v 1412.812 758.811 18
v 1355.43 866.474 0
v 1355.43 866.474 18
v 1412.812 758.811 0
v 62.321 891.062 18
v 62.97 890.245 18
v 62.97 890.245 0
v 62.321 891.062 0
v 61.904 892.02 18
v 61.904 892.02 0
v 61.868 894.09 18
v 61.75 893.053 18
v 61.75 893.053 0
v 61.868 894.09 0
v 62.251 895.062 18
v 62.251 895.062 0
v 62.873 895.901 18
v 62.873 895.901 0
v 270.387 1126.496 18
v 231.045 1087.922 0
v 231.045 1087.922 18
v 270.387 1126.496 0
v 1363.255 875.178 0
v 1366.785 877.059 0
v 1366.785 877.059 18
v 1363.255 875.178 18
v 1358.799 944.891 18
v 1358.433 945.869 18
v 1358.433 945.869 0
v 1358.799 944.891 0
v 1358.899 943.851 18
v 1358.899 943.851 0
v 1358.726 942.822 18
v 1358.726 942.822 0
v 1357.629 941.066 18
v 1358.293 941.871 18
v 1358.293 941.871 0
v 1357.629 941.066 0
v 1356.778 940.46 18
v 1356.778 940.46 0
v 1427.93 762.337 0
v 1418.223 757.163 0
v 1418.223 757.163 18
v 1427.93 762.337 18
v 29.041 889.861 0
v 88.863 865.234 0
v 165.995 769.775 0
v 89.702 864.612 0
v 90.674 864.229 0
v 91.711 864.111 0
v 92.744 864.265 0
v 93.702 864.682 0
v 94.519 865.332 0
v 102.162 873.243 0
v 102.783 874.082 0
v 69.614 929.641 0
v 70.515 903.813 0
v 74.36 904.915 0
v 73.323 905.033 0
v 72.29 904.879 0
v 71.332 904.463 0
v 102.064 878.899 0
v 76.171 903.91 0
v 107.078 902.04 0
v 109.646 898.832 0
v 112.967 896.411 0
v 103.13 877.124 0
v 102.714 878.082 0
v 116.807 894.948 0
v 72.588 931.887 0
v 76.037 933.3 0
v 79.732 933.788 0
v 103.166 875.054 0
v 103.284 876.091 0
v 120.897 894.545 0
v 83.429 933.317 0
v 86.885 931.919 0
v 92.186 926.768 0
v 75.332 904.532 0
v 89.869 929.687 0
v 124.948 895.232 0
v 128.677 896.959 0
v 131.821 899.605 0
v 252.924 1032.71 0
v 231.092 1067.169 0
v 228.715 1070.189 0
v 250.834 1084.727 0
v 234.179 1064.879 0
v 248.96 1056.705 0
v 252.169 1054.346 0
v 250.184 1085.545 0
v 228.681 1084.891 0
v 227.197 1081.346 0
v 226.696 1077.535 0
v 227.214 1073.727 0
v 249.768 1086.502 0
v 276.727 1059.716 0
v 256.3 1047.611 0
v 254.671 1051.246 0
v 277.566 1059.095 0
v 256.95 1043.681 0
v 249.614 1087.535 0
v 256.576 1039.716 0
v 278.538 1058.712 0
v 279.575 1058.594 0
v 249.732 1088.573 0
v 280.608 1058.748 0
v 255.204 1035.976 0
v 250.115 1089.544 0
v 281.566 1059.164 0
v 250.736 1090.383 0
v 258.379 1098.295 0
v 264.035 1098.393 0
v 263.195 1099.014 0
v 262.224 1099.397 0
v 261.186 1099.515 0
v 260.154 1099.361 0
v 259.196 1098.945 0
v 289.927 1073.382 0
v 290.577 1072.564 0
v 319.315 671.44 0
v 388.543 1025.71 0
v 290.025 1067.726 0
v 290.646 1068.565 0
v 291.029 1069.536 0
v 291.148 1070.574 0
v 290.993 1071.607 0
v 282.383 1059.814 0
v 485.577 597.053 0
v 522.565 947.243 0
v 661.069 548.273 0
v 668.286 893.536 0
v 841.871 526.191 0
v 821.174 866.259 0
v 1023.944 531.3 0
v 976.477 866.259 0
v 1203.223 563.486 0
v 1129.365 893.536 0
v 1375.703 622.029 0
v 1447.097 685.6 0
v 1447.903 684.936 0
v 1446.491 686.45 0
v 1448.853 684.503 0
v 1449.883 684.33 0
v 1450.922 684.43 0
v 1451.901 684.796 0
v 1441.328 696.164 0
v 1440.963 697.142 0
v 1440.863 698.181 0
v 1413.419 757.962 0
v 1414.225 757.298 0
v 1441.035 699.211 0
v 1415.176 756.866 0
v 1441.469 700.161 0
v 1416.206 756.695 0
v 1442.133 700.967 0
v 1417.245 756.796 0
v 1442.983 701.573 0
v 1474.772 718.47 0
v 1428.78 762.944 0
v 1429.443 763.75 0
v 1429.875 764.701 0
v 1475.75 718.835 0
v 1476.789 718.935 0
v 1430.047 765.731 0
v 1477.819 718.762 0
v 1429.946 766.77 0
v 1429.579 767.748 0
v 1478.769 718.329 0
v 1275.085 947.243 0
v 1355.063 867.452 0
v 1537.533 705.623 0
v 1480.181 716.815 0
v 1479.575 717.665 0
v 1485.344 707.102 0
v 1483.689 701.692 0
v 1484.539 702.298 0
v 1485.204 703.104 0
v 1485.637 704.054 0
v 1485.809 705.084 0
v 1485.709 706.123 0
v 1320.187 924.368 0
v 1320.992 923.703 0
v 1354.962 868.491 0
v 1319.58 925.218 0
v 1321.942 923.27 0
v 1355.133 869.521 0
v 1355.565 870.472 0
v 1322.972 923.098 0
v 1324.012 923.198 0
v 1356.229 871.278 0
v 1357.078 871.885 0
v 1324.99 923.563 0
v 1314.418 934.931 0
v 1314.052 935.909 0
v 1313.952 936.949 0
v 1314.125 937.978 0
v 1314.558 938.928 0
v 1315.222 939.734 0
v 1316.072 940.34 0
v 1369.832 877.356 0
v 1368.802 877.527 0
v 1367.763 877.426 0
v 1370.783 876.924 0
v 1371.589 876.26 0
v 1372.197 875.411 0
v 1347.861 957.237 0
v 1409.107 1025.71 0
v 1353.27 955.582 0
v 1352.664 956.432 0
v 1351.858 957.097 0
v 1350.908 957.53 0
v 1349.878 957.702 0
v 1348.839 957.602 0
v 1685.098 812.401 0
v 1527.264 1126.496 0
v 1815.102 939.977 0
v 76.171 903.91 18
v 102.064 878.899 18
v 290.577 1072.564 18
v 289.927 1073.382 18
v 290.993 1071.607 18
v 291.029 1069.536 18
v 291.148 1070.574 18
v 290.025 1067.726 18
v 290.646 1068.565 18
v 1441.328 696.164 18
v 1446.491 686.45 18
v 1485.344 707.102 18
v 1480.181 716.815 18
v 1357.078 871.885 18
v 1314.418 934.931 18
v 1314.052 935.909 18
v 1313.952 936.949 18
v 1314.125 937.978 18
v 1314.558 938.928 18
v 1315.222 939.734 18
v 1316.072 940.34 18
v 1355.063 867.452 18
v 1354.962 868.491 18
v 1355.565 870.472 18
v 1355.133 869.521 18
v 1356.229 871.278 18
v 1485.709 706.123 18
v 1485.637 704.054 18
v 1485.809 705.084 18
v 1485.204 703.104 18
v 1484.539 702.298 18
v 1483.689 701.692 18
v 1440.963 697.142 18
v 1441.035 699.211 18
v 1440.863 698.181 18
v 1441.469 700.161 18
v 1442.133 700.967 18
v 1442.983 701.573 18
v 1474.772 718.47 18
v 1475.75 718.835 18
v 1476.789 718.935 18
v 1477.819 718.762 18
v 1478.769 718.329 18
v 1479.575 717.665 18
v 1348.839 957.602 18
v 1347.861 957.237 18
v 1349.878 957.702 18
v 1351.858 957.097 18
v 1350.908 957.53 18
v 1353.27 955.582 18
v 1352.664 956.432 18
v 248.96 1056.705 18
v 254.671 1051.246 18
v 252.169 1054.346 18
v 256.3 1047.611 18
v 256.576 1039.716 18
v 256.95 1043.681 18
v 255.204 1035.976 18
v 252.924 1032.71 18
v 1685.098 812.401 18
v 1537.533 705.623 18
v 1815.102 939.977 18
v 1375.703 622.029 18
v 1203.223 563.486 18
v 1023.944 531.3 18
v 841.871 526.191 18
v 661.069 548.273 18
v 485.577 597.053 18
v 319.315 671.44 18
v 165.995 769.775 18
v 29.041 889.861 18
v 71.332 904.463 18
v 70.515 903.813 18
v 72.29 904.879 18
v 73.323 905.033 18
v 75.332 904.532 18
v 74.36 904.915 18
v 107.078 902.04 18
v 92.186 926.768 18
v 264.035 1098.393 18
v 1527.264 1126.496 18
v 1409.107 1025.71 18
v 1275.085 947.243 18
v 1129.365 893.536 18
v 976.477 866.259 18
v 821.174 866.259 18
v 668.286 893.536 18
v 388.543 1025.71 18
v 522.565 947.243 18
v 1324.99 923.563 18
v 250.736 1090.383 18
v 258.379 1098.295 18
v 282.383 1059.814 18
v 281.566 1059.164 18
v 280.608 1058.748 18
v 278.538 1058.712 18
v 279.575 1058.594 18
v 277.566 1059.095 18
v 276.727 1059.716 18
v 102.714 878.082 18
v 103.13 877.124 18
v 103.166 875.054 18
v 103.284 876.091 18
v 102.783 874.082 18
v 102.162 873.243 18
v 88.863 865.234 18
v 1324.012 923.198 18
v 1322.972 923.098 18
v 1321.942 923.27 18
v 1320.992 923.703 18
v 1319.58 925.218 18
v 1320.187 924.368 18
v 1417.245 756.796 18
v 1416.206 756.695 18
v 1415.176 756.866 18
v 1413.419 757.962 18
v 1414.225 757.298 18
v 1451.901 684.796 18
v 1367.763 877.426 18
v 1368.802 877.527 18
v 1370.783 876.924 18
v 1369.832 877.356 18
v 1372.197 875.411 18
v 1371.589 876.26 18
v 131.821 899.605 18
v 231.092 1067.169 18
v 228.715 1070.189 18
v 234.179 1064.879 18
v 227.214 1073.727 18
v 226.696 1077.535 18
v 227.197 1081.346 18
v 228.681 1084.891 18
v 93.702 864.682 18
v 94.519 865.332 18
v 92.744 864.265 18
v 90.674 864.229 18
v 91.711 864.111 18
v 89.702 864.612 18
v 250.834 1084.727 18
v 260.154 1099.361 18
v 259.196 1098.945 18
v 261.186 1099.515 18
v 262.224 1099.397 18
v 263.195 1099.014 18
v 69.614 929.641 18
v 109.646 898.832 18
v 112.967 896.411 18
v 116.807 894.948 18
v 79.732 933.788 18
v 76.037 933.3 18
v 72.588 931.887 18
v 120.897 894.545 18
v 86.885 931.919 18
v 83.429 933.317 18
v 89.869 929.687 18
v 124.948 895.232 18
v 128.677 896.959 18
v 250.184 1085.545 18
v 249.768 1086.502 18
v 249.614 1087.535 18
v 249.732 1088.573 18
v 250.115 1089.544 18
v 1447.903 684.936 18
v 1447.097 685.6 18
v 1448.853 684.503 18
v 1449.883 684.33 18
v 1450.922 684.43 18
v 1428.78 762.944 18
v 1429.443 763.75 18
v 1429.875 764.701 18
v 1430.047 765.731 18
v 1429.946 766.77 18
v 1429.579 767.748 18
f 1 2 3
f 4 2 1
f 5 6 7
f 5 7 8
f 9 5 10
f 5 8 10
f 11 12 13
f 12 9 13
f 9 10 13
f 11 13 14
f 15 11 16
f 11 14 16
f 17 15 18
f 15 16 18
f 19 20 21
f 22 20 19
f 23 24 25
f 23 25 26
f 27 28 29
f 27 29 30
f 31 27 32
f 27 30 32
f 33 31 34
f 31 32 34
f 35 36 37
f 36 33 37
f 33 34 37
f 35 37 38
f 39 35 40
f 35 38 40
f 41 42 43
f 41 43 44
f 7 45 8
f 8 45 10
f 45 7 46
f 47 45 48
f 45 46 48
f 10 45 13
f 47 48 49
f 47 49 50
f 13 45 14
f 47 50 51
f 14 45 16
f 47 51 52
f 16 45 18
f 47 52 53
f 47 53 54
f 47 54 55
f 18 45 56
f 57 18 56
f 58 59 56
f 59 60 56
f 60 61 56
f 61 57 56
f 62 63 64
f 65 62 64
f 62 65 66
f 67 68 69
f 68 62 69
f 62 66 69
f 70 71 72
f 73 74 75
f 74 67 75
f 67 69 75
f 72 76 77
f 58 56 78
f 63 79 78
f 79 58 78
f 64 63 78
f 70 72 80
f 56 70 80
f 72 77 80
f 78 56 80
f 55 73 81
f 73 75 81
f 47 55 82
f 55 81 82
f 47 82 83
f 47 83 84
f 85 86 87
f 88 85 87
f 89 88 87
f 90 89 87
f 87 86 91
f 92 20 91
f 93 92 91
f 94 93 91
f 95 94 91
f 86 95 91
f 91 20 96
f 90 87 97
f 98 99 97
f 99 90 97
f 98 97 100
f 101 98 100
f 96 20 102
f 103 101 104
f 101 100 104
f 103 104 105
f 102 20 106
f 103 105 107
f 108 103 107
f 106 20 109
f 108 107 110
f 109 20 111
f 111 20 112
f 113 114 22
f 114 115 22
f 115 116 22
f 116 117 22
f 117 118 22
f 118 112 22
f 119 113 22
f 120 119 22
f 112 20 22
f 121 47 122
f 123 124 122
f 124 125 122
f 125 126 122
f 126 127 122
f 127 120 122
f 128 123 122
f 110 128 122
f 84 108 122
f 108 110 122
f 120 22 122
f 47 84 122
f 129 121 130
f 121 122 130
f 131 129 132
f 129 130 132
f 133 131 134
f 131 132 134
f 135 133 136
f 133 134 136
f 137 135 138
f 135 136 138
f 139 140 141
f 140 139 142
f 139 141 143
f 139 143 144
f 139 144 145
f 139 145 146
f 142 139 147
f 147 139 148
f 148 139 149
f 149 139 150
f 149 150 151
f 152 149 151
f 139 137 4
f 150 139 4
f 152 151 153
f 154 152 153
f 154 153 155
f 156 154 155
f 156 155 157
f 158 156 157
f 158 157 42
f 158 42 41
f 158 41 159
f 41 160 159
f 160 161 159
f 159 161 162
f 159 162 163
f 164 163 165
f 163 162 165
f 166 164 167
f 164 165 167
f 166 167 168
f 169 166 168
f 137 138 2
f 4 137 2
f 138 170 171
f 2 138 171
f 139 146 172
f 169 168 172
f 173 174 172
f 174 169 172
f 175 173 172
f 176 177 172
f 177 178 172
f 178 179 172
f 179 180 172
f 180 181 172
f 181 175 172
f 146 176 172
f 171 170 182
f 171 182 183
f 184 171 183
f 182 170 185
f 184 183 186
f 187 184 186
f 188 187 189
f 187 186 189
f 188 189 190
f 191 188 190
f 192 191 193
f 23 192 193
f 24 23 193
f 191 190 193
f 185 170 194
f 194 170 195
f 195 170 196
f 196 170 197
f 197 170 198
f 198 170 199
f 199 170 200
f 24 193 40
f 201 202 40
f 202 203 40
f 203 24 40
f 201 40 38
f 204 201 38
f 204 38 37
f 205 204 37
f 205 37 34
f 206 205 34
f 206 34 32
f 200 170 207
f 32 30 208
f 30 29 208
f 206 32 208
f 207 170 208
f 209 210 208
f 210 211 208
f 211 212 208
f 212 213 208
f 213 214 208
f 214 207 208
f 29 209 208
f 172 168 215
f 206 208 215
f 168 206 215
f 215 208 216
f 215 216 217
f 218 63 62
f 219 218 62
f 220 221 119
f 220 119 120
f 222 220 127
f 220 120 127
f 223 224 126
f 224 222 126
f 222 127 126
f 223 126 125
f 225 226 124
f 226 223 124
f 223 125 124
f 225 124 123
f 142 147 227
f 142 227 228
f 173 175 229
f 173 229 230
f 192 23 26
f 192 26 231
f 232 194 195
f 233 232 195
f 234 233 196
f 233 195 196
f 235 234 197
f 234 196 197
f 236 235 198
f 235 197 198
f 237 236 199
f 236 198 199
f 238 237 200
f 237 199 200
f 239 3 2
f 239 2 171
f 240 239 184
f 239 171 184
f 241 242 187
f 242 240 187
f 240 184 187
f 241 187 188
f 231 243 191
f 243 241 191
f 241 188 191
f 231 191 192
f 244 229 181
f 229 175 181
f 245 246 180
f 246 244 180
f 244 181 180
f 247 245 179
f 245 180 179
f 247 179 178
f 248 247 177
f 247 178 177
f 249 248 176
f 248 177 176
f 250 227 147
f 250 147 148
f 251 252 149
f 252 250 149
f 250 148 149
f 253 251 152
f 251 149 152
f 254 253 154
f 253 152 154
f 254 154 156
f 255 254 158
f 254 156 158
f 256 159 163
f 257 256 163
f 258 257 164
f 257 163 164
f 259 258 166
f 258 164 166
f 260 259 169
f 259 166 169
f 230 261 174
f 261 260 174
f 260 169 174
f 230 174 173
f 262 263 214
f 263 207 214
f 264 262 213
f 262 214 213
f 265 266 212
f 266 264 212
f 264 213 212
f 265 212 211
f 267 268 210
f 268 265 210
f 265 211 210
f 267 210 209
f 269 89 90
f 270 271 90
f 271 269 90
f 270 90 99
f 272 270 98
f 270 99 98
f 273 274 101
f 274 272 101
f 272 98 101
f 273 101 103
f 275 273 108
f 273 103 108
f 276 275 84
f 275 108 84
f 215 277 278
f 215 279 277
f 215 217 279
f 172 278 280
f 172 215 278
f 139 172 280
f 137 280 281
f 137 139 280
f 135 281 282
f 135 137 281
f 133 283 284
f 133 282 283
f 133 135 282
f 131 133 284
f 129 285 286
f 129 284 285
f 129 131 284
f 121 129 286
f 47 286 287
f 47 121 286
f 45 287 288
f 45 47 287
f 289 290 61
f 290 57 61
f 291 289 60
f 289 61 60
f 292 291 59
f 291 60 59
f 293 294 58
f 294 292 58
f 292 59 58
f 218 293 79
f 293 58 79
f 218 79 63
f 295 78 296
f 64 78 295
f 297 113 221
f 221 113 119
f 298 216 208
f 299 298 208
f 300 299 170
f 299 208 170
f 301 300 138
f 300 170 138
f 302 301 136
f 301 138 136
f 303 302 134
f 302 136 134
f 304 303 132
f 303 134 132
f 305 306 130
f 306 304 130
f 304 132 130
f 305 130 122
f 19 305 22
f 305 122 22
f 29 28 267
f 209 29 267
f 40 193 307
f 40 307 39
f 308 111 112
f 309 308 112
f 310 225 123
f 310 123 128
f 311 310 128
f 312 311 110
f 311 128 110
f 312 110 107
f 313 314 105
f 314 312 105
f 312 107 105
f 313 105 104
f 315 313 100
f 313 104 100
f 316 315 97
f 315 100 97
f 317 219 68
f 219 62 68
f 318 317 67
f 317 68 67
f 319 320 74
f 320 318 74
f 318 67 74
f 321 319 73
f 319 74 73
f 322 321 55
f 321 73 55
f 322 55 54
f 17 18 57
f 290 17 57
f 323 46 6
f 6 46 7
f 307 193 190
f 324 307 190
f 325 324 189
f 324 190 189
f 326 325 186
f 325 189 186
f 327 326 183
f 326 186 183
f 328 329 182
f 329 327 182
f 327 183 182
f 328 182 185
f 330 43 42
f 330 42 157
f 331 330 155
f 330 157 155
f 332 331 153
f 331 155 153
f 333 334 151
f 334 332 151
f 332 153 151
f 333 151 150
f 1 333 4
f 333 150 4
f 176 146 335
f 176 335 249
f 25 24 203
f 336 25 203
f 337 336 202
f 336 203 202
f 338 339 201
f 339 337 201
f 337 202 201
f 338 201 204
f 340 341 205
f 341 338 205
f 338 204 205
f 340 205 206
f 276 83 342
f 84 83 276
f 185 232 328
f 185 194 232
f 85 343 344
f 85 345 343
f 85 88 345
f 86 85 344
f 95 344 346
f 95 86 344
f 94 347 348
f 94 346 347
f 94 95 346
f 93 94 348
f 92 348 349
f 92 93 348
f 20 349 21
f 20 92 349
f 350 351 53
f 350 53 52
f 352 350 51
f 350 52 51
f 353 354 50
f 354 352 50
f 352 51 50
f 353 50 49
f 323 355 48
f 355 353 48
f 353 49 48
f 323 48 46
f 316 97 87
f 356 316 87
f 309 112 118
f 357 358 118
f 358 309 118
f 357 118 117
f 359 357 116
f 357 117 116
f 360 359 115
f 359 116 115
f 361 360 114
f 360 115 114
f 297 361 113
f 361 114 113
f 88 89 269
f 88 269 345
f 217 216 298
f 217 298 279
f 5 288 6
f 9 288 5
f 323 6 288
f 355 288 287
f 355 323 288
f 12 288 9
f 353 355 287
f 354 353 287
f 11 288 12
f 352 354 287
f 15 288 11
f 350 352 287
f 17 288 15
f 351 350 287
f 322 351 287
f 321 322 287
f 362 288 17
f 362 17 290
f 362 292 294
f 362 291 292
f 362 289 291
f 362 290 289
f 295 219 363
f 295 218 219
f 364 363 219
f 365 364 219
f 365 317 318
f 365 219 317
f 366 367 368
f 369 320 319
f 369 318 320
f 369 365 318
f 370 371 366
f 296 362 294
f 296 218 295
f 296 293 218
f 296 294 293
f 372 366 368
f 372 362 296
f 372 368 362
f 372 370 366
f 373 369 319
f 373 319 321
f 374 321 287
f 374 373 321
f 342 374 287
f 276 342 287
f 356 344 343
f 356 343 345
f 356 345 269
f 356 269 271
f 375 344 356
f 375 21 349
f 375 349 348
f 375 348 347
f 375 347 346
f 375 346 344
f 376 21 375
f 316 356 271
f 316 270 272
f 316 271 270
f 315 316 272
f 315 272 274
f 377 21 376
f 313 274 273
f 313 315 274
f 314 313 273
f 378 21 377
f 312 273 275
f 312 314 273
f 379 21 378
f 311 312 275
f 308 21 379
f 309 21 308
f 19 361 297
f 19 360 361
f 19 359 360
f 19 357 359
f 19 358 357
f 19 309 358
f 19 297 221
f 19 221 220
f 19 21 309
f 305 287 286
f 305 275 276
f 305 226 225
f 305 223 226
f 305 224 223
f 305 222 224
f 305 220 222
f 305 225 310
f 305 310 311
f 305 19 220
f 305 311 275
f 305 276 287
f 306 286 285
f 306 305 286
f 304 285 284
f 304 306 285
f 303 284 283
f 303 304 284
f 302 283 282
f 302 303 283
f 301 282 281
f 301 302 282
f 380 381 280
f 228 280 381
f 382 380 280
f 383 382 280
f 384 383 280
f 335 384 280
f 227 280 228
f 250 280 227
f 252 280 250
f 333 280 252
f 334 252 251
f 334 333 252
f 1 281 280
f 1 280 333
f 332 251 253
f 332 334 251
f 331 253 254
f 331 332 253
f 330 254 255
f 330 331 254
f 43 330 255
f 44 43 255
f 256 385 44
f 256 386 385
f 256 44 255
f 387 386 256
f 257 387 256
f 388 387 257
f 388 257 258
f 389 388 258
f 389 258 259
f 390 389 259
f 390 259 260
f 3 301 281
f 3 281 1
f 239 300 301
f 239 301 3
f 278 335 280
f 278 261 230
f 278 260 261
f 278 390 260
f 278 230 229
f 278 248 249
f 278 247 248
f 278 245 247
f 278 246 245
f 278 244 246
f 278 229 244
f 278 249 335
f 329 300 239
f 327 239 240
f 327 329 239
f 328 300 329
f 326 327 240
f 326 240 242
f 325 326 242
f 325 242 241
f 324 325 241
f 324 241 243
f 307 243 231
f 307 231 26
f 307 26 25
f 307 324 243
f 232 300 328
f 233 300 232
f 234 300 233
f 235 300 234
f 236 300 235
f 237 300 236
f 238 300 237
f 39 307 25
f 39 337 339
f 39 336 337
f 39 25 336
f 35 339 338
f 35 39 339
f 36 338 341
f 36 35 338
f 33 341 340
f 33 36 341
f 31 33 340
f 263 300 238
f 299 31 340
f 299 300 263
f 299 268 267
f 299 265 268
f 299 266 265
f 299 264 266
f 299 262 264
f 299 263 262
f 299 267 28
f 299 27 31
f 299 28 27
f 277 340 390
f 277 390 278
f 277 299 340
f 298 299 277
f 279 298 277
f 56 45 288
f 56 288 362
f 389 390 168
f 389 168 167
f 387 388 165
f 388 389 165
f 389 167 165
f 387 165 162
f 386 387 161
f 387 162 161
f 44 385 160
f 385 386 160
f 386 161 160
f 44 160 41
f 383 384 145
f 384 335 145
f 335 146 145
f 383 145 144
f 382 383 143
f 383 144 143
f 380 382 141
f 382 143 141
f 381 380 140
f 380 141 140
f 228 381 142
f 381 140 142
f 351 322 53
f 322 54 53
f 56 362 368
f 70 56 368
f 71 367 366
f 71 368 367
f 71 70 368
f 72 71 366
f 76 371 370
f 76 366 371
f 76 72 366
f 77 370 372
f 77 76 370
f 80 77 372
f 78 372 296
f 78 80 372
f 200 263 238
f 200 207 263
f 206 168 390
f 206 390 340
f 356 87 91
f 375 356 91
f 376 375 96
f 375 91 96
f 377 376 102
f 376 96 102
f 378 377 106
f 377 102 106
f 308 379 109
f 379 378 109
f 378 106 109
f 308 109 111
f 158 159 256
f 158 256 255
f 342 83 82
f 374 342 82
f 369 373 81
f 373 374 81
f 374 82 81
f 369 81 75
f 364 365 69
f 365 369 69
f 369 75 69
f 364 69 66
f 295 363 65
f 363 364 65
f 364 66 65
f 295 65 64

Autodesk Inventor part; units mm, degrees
ref_plane "YZ Plane" through (0, 0, 0) normal (1, 0, 0) x (0, 1, 0)
ref_plane "XZ Plane" through (0, 0, 0) normal (0, 1, 0) x (-1, 0, 0)
ref_plane "XY Plane" through (0, 0, 0) normal (0, 0, 1) x (1, 0, 0)
sketch "CONTOURS" plane through (0, 0, 0) normal (0, 0, 1) x (1, 0, 0)
  line L0 (29.0412, 889.8609) -> (69.6135, 929.6413)
  arc A0 (92.1865, 926.768) -> (69.6135, 929.6413) centre (79.765, 919.2877) ccw
  line L1 (92.1865, 926.768) -> (107.0781, 902.0398)
  arc A1 (107.0781, 902.0398) -> (131.8211, 899.605) centre (120.3563, 910.0361) ccw
  line L2 (131.8211, 899.605) -> (252.9238, 1032.7101)
  arc A2 (252.9238, 1032.7101) -> (248.9601, 1056.7052) centre (241.459, 1043.1412) ccw
  line L3 (248.9601, 1056.7052) -> (234.1791, 1064.8793)
  arc A3 (231.0447, 1087.9218) -> (234.1791, 1064.8793) centre (241.1963, 1077.5683) ccw
  line L4 (231.0447, 1087.9218) -> (270.3869, 1126.4961)
  arc A4 (270.3869, 1126.4961) -> (1527.2637, 1126.4961) centre (898.8253, 1743.5906) ccw
  line L5 (1527.2637, 1126.4961) -> (1815.1018, 939.9773)
  arc A5 (29.0412, 889.8609) -> (1815.1018, 939.9773) centre (898.8169, 1743.6721) ccw
sketch "HOLES" plane through (0, 0, 0) normal (0, 0, 1) x (1, 0, 0)
  line L0 (290.0252, 1067.7256) -> (282.3828, 1059.8139)
  arc A0 (276.7268, 1059.716) -> (282.3828, 1059.8139) centre (279.5059, 1062.593) ccw
  line L1 (276.7268, 1059.716) -> (250.8342, 1084.7274)
  arc A1 (250.7363, 1090.3834) -> (250.8342, 1084.7274) centre (253.6132, 1087.6044) ccw
  line L2 (250.7363, 1090.3834) -> (258.3786, 1098.2951)
  arc A2 (264.0347, 1098.393) -> (258.3786, 1098.2951) centre (261.2556, 1095.516) ccw
  line L3 (264.0347, 1098.393) -> (289.9273, 1073.3816)
  arc A3 (290.0252, 1067.7256) -> (289.9273, 1073.3816) centre (287.1482, 1070.5046) ccw
  line L4 (102.1615, 873.2431) -> (94.5191, 865.3315)
  arc A4 (88.8631, 865.2335) -> (94.5191, 865.3315) centre (91.6422, 868.1105) ccw
  line L5 (88.8631, 865.2335) -> (62.9705, 890.245)
  arc A5 (62.8726, 895.901) -> (62.9705, 890.245) centre (65.7496, 893.1219) ccw
  line L6 (62.8726, 895.901) -> (70.515, 903.8126)
  arc A6 (76.171, 903.9105) -> (70.515, 903.8126) centre (73.3919, 901.0336) ccw
  arc A7 (102.1615, 873.2431) -> (102.0636, 878.8991) centre (99.2846, 876.0221) ccw
  line L7 (1358.4331, 945.869) -> (1353.2703, 955.5821)
  arc A8 (1353.2703, 955.5821) -> (1347.8609, 957.2368) centre (1349.7382, 953.7047) ccw
  line L8 (1347.8609, 957.2368) -> (1316.0723, 940.3404)
  arc A9 (1316.0723, 940.3404) -> (1314.4176, 934.931) centre (1317.9497, 936.8084) ccw
  line L9 (1314.4176, 934.931) -> (1319.5804, 925.2178)
  arc A10 (1319.5804, 925.2178) -> (1324.9899, 923.5631) centre (1323.1125, 927.0952) ccw
  line L10 (1324.9899, 923.5631) -> (1356.7784, 940.4595)
  arc A11 (1356.7784, 940.4595) -> (1358.4331, 945.869) centre (1354.901, 943.9916) ccw
  line L11 (1441.3284, 696.1636) -> (1446.4912, 686.4505)
  arc A12 (1446.4912, 686.4505) -> (1451.9006, 684.7958) centre (1450.0232, 688.3278) ccw
  line L12 (1451.9006, 684.7958) -> (1483.6892, 701.6922)
  arc A13 (1483.6892, 701.6922) -> (1485.3438, 707.1016) centre (1481.8118, 705.2242) ccw
  line L13 (1485.3438, 707.1016) -> (1480.181, 716.8148)
  arc A14 (1480.181, 716.8148) -> (1474.7716, 718.4695) centre (1476.649, 714.9374) ccw
  line L14 (1474.7716, 718.4695) -> (1442.9831, 701.5731)
  arc A15 (1442.9831, 701.5731) -> (1441.3284, 696.1636) centre (1444.8604, 698.041) ccw
  line L15 (1363.2554, 875.1779) -> (1357.078, 871.8854)
  arc A16 (1357.078, 871.8854) -> (1355.4295, 866.4741) centre (1358.9594, 868.3555) ccw
  line L16 (1355.4295, 866.4741) -> (1412.8118, 758.8114)
  arc A17 (1412.8118, 758.8114) -> (1418.2231, 757.1628) centre (1416.3417, 760.6927) ccw
  line L17 (1418.2231, 757.1628) -> (1427.9304, 762.3366)
  arc A18 (1427.9304, 762.3366) -> (1429.579, 767.7479) centre (1426.049, 765.8666) ccw
  line L18 (1429.579, 767.7479) -> (1372.1967, 875.4107)
  arc A19 (1372.1967, 875.4107) -> (1366.7853, 877.0592) centre (1368.6667, 873.5293) ccw
  line L19 (1366.7853, 877.0592) -> (1363.2554, 875.1779)
  line L20 (76.171, 903.9105) -> (102.0636, 878.8991)
sketch "LETTERS" plane through (0, 0, 0) normal (0, 0, 1) x (1, 0, 0)
  line L0 (246.1168, 901.1678) -> (246.0351, 901.3924)
  line L1 (246.0351, 901.3924) -> (245.9598, 901.6191)
  line L2 (245.9598, 901.6191) -> (245.8908, 901.8478)
  line L3 (245.8908, 901.8478) -> (245.8282, 902.0782)
  line L4 (245.8282, 902.0782) -> (245.7719, 902.3102)
  line L5 (245.7719, 902.3102) -> (245.722, 902.5436)
  line L6 (245.722, 902.5436) -> (245.6784, 902.7782)
  line L7 (245.6784, 902.7782) -> (245.6412, 903.0139)
  line L8 (245.6412, 903.0139) -> (245.6104, 903.2504)
  line L9 (245.6104, 903.2504) -> (245.586, 903.4876)
  line L10 (245.586, 903.4876) -> (245.5679, 903.7253)
  line L11 (245.5679, 903.7253) -> (245.5562, 903.9634)
  line L12 (245.5562, 903.9634) -> (245.551, 904.2015)
  line L13 (245.551, 904.2015) -> (245.5521, 904.4397)
  line L14 (245.5521, 904.4397) -> (245.5596, 904.6777)
  line L15 (245.5596, 904.6777) -> (245.5736, 904.9152)
  line L16 (245.5736, 904.9152) -> (245.594, 905.1522)
  line L17 (245.594, 905.1522) -> (245.6208, 905.3885)
  line L18 (245.6208, 905.3885) -> (245.654, 905.6238)
  line L19 (245.654, 905.6238) -> (245.6937, 905.8581)
  line L20 (245.6937, 905.8581) -> (245.7398, 906.0911)
  line L21 (245.7398, 906.0911) -> (245.7923, 906.3226)
  line L22 (245.7923, 906.3226) -> (245.8513, 906.5525)
  line L23 (245.8513, 906.5525) -> (245.9168, 906.7806)
  line L24 (245.9168, 906.7806) -> (245.9887, 907.0067)
  line L25 (245.9887, 907.0067) -> (246.0671, 907.2306)
  line L26 (246.0671, 907.2306) -> (246.1519, 907.4522)
  line L27 (246.1519, 907.4522) -> (246.2433, 907.6712)
  line L28 (246.2433, 907.6712) -> (246.3411, 907.8876)
  line L29 (246.3411, 907.8876) -> (246.4454, 908.1011)
  line L30 (246.4454, 908.1011) -> (246.5562, 908.3115)
  line L31 (246.5562, 908.3115) -> (246.6735, 908.5187)
  line L32 (246.6735, 908.5187) -> (246.7973, 908.7225)
  line L33 (246.7973, 908.7225) -> (246.9274, 908.9228)
  line L34 (246.9274, 908.9228) -> (247.0637, 909.1194)
  line L35 (247.0637, 909.1194) -> (247.2058, 909.3123)
  line L36 (247.2058, 909.3123) -> (247.3538, 909.5013)
  line L37 (247.3538, 909.5013) -> (247.5073, 909.6863)
  line L38 (247.5073, 909.6863) -> (247.6661, 909.8672)
  line L39 (247.6661, 909.8672) -> (247.8302, 910.0439)
  line L40 (247.8302, 910.0439) -> (247.9992, 910.2163)
  line L41 (247.9992, 910.2163) -> (248.1731, 910.3842)
  line L42 (248.1731, 910.3842) -> (248.3515, 910.5476)
  line L43 (248.3515, 910.5476) -> (248.5344, 910.7063)
  line L44 (248.5344, 910.7063) -> (248.7216, 910.8603)
  line L45 (248.7216, 910.8603) -> (248.9128, 911.0093)
  line L46 (248.9128, 911.0093) -> (249.1078, 911.1534)
  line L47 (249.1078, 911.1534) -> (249.3066, 911.2923)
  line L48 (249.3066, 911.2923) -> (249.5088, 911.426)
  line L49 (249.5088, 911.426) -> (249.7143, 911.5543)
  line L50 (249.7143, 911.5543) -> (249.9229, 911.6772)
  line L51 (249.9229, 911.6772) -> (250.1344, 911.7944)
  line L52 (250.1344, 911.7944) -> (250.3487, 911.906)
  line L53 (250.3487, 911.906) -> (250.5655, 912.0118)
  line L54 (250.5655, 912.0118) -> (250.7846, 912.1117)
  line L55 (250.7846, 912.1117) -> (251.0059, 912.2055)
  line L56 (251.0059, 912.2055) -> (251.2292, 912.2932)
  line L57 (251.2292, 912.2932) -> (251.4543, 912.3746)
  line L58 (251.4543, 912.3746) -> (251.6809, 912.4497)
  line L59 (251.6809, 912.4497) -> (251.909, 912.5182)
  line L60 (251.909, 912.5182) -> (252.1383, 912.5802)
  line L61 (252.1383, 912.5802) -> (252.3686, 912.6354)
  line L62 (252.3686, 912.6354) -> (252.5997, 912.6838)
  line L63 (252.5997, 912.6838) -> (252.8315, 912.7253)
  line L64 (252.8315, 912.7253) -> (253.0638, 912.7597)
  line L65 (253.0638, 912.7597) -> (253.2964, 912.7872)
  line L66 (253.2964, 912.7872) -> (253.5293, 912.8077)
  line L67 (253.5293, 912.8077) -> (253.7624, 912.8215)
  line L68 (253.7624, 912.8215) -> (253.9954, 912.8287)
  line L69 (253.9954, 912.8287) -> (254.2285, 912.8292)
  line L70 (254.2285, 912.8292) -> (254.4614, 912.8232)
  line L71 (254.4614, 912.8232) -> (254.694, 912.8108)
  line L72 (254.694, 912.8108) -> (254.9262, 912.7921)
  line L73 (254.9262, 912.7921) -> (255.158, 912.7672)
  line L74 (255.158, 912.7672) -> (255.3893, 912.7361)
  line L75 (255.3893, 912.7361) -> (255.6198, 912.699)
  line L76 (255.6198, 912.699) -> (255.8496, 912.656)
  line L77 (255.8496, 912.656) -> (256.0785, 912.6071)
  line L78 (256.0785, 912.6071) -> (256.3065, 912.5524)
  line L79 (256.3065, 912.5524) -> (256.5333, 912.4921)
  line L80 (256.5333, 912.4921) -> (256.759, 912.4263)
  line L81 (256.759, 912.4263) -> (256.9834, 912.3549)
  line L82 (256.9834, 912.3549) -> (257.2064, 912.2781)
  line L83 (257.2064, 912.2781) -> (257.4279, 912.1961)
  line L84 (257.4279, 912.1961) -> (257.6478, 912.1088)
  line L85 (257.6478, 912.1088) -> (257.8661, 912.0165)
  line L86 (257.8661, 912.0165) -> (258.0825, 911.9191)
  line L87 (258.0825, 911.9191) -> (258.297, 911.8168)
  line L88 (258.297, 911.8168) -> (258.5095, 911.7097)
  line L89 (258.5095, 911.7097) -> (258.7199, 911.5978)
  line L90 (258.7199, 911.5978) -> (258.9281, 911.4814)
  line L91 (258.9281, 911.4814) -> (259.134, 911.3603)
  line L92 (259.134, 911.3603) -> (259.3375, 911.2348)
  line L93 (259.3375, 911.2348) -> (259.5384, 911.105)
  line L94 (259.5384, 911.105) -> (259.7367, 910.9709)
  line L95 (259.7367, 910.9709) -> (259.9323, 910.8326)
  line L96 (259.9323, 910.8326) -> (260.1251, 910.6902)
  line L97 (260.1251, 910.6902) -> (260.315, 910.5438)
  line L98 (260.315, 910.5438) -> (260.5019, 910.3936)
  line L99 (260.5019, 910.3936) -> (260.6858, 910.2394)
  line L100 (260.6858, 910.2394) -> (260.8666, 910.0816)
  line L101 (260.8666, 910.0816) -> (261.0443, 909.92)
  line L102 (261.0443, 909.92) -> (261.2187, 909.7549)
  line L103 (261.2187, 909.7549) -> (261.3897, 909.5863)
  line L104 (261.3897, 909.5863) -> (261.5574, 909.4142)
  line L105 (261.5574, 909.4142) -> (261.7217, 909.2389)
  line L106 (261.7217, 909.2389) -> (261.8825, 909.0602)
  line L107 (261.8825, 909.0602) -> (262.0396, 908.8784)
  line L108 (262.0396, 908.8784) -> (262.1932, 908.6935)
  line L109 (262.1932, 908.6935) -> (262.343, 908.5056)
  line L110 (262.343, 908.5056) -> (262.489, 908.3148)
  line L111 (262.489, 908.3148) -> (262.6311, 908.1211)
  line L112 (262.6311, 908.1211) -> (262.7694, 907.9247)
  line L113 (262.7694, 907.9247) -> (262.9036, 907.7256)
  line L114 (262.9036, 907.7256) -> (263.0338, 907.5239)
  line L115 (263.0338, 907.5239) -> (263.1599, 907.3197)
  line L116 (263.1599, 907.3197) -> (263.2817, 907.1131)
  line L117 (263.2817, 907.1131) -> (263.3993, 906.9041)
  line L118 (263.3993, 906.9041) -> (263.5126, 906.6929)
  line L119 (263.5126, 906.6929) -> (263.6214, 906.4795)
  line L120 (263.6214, 906.4795) -> (263.7258, 906.264)
  line L121 (263.7258, 906.264) -> (263.8257, 906.0465)
  line L122 (263.8257, 906.0465) -> (263.9209, 905.827)
  line L123 (263.9209, 905.827) -> (264.0114, 905.6057)
  line L124 (264.0114, 905.6057) -> (264.0973, 905.3826)
  line L125 (264.0973, 905.3826) -> (264.1782, 905.1579)
  line L126 (264.1782, 905.1579) -> (264.2544, 904.9316)
  line L127 (264.2544, 904.9316) -> (264.3255, 904.7037)
  line L128 (264.3255, 904.7037) -> (264.3917, 904.4744)
  line L129 (264.3917, 904.4744) -> (264.4527, 904.2438)
  line L130 (264.4527, 904.2438) -> (264.5087, 904.012)
  line L131 (264.5087, 904.012) -> (264.5596, 903.7792)
  line L132 (264.5596, 903.7792) -> (264.6053, 903.5455)
  line L133 (264.6053, 903.5455) -> (264.6458, 903.3109)
  line L134 (264.6458, 903.3109) -> (264.6811, 903.0757)
  line L135 (264.6811, 903.0757) -> (264.7111, 902.84)
  line L136 (264.7111, 902.84) -> (264.7358, 902.6039)
  line L137 (264.7358, 902.6039) -> (264.7552, 902.3675)
  line L138 (264.7552, 902.3675) -> (264.7692, 902.1309)
  line L139 (264.7692, 902.1309) -> (264.7779, 901.8943)
  line L140 (264.7779, 901.8943) -> (264.781, 901.6578)
  line L141 (264.781, 901.6578) -> (264.7787, 901.4216)
  line L142 (264.7787, 901.4216) -> (264.7709, 901.1857)
  line L143 (264.7709, 901.1857) -> (264.7576, 900.9503)
  line L144 (264.7576, 900.9503) -> (264.7387, 900.7155)
  line L145 (264.7387, 900.7155) -> (264.7141, 900.4815)
  line L146 (264.7141, 900.4815) -> (264.684, 900.2483)
  line L147 (264.684, 900.2483) -> (264.6481, 900.0162)
  line L148 (264.6481, 900.0162) -> (264.6065, 899.7851)
  line L149 (264.6065, 899.7851) -> (264.5592, 899.5554)
  line L150 (264.5592, 899.5554) -> (264.5061, 899.327)
  line L151 (264.5061, 899.327) -> (264.4472, 899.1002)
  line L152 (264.4472, 899.1002) -> (264.3824, 898.875)
  line L153 (264.3824, 898.875) -> (264.3117, 898.6515)
  line L154 (264.3117, 898.6515) -> (264.2351, 898.43)
  line L155 (264.2351, 898.43) -> (264.1526, 898.2105)
  line L156 (264.1526, 898.2105) -> (264.064, 897.9932)
  line L157 (264.064, 897.9932) -> (263.9694, 897.7781)
  line L158 (263.9694, 897.7781) -> (263.8688, 897.5655)
  line L159 (263.8688, 897.5655) -> (263.762, 897.3554)
  line L160 (263.6492, 897.148) -> (263.5303, 896.9434)
  line L161 (263.5303, 896.9434) -> (263.4056, 896.7417)
  line L162 (263.4056, 896.7417) -> (263.2753, 896.5431)
  line L163 (263.2753, 896.5431) -> (263.1393, 896.3477)
  line L164 (263.1393, 896.3477) -> (262.9979, 896.1557)
  line L165 (262.9979, 896.1557) -> (262.8513, 895.9671)
  line L166 (262.8513, 895.9671) -> (262.6996, 895.7821)
  line L167 (262.6996, 895.7821) -> (262.5428, 895.6009)
  line L168 (262.5428, 895.6009) -> (262.3813, 895.4235)
  line L169 (262.3813, 895.4235) -> (262.215, 895.2501)
  line L170 (262.215, 895.2501) -> (262.0442, 895.0809)
  line L171 (262.0442, 895.0809) -> (261.869, 894.9159)
  line L172 (261.869, 894.9159) -> (261.6896, 894.7553)
  line L173 (261.6896, 894.7553) -> (261.506, 894.5993)
  line L174 (261.506, 894.5993) -> (261.3185, 894.4479)
  line L175 (261.3185, 894.4479) -> (261.1271, 894.3014)
  line L176 (261.1271, 894.3014) -> (260.9321, 894.1597)
  line L177 (260.9321, 894.1597) -> (260.7336, 894.0231)
  line L178 (260.7336, 894.0231) -> (260.5316, 893.8917)
  line L179 (260.5316, 893.8917) -> (260.3264, 893.7657)
  line L180 (260.3264, 893.7657) -> (260.1181, 893.6451)
  line L181 (260.1181, 893.6451) -> (259.9069, 893.5301)
  line L182 (259.9069, 893.5301) -> (259.6928, 893.4208)
  line L183 (259.6928, 893.4208) -> (259.4761, 893.3174)
  line L184 (259.4761, 893.3174) -> (259.2568, 893.22)
  line L185 (259.2568, 893.22) -> (259.0352, 893.1287)
  line L186 (259.0352, 893.1287) -> (258.8114, 893.0437)
  line L187 (258.8114, 893.0437) -> (258.5854, 892.965)
  line L188 (258.5854, 892.965) -> (258.3575, 892.8929)
  line L189 (258.3575, 892.8929) -> (258.1278, 892.8275)
  line L190 (258.1278, 892.8275) -> (257.8965, 892.7688)
  line L191 (257.8965, 892.7688) -> (257.6637, 892.717)
  line L192 (257.6637, 892.717) -> (257.4295, 892.6722)
  line L193 (257.4295, 892.6722) -> (257.1943, 892.6343)
  line L194 (257.1943, 892.6343) -> (256.9581, 892.6033)
  line L195 (256.9581, 892.6033) -> (256.7213, 892.5793)
  line L196 (256.7213, 892.5793) -> (256.484, 892.5622)
  line L197 (256.484, 892.5622) -> (256.2464, 892.552)
  line L198 (256.2464, 892.552) -> (256.0087, 892.5488)
  line L199 (256.0087, 892.5488) -> (255.7711, 892.5526)
  line L200 (255.7711, 892.5526) -> (255.5339, 892.5633)
  line L201 (255.5339, 892.5633) -> (255.2972, 892.5809)
  line L202 (255.2972, 892.5809) -> (255.0612, 892.6055)
  line L203 (255.0612, 892.6055) -> (254.8262, 892.6371)
  line L204 (254.8262, 892.6371) -> (254.5924, 892.6756)
  line L205 (254.5924, 892.6756) -> (254.3599, 892.721)
  line L206 (254.3599, 892.721) -> (254.1289, 892.7734)
  line L207 (254.1289, 892.7734) -> (253.8997, 892.8328)
  line L208 (253.8997, 892.8328) -> (253.6725, 892.8992)
  line L209 (253.6725, 892.8992) -> (253.4474, 892.9725)
  line L210 (253.4474, 892.9725) -> (253.2248, 893.0528)
  line L211 (253.2248, 893.0528) -> (253.0047, 893.14)
  line L212 (253.0047, 893.14) -> (252.7873, 893.2342)
  line L213 (252.7873, 893.2342) -> (252.573, 893.3354)
  line L214 (252.573, 893.3354) -> (252.3619, 893.4436)
  line L215 (252.3619, 893.4436) -> (252.1541, 893.5587)
  line L216 (252.1541, 893.5587) -> (251.95, 893.6809)
  line L217 (251.95, 893.6809) -> (251.7497, 893.81)
  line L218 (251.7497, 893.81) -> (251.5533, 893.9461)
  line L219 (251.5533, 893.9461) -> (251.3612, 894.0891)
  line L220 (251.3612, 894.0891) -> (251.1734, 894.2391)
  line L221 (251.1734, 894.2391) -> (250.9903, 894.3962)
  line L222 (250.9903, 894.3962) -> (250.9005, 894.4773)
  line L223 (250.9005, 894.4773) -> (250.812, 894.5602)
  line L224 (263.762, 897.3554) -> (263.6492, 897.148)
extrude "Extrusion3" add sketch "CONTOURS" along normal blind 18
extrude "Extrusion4" cut sketch "HOLES" along normal blind 18
properties part number "Platform C4" material "Wood (Birch)"
